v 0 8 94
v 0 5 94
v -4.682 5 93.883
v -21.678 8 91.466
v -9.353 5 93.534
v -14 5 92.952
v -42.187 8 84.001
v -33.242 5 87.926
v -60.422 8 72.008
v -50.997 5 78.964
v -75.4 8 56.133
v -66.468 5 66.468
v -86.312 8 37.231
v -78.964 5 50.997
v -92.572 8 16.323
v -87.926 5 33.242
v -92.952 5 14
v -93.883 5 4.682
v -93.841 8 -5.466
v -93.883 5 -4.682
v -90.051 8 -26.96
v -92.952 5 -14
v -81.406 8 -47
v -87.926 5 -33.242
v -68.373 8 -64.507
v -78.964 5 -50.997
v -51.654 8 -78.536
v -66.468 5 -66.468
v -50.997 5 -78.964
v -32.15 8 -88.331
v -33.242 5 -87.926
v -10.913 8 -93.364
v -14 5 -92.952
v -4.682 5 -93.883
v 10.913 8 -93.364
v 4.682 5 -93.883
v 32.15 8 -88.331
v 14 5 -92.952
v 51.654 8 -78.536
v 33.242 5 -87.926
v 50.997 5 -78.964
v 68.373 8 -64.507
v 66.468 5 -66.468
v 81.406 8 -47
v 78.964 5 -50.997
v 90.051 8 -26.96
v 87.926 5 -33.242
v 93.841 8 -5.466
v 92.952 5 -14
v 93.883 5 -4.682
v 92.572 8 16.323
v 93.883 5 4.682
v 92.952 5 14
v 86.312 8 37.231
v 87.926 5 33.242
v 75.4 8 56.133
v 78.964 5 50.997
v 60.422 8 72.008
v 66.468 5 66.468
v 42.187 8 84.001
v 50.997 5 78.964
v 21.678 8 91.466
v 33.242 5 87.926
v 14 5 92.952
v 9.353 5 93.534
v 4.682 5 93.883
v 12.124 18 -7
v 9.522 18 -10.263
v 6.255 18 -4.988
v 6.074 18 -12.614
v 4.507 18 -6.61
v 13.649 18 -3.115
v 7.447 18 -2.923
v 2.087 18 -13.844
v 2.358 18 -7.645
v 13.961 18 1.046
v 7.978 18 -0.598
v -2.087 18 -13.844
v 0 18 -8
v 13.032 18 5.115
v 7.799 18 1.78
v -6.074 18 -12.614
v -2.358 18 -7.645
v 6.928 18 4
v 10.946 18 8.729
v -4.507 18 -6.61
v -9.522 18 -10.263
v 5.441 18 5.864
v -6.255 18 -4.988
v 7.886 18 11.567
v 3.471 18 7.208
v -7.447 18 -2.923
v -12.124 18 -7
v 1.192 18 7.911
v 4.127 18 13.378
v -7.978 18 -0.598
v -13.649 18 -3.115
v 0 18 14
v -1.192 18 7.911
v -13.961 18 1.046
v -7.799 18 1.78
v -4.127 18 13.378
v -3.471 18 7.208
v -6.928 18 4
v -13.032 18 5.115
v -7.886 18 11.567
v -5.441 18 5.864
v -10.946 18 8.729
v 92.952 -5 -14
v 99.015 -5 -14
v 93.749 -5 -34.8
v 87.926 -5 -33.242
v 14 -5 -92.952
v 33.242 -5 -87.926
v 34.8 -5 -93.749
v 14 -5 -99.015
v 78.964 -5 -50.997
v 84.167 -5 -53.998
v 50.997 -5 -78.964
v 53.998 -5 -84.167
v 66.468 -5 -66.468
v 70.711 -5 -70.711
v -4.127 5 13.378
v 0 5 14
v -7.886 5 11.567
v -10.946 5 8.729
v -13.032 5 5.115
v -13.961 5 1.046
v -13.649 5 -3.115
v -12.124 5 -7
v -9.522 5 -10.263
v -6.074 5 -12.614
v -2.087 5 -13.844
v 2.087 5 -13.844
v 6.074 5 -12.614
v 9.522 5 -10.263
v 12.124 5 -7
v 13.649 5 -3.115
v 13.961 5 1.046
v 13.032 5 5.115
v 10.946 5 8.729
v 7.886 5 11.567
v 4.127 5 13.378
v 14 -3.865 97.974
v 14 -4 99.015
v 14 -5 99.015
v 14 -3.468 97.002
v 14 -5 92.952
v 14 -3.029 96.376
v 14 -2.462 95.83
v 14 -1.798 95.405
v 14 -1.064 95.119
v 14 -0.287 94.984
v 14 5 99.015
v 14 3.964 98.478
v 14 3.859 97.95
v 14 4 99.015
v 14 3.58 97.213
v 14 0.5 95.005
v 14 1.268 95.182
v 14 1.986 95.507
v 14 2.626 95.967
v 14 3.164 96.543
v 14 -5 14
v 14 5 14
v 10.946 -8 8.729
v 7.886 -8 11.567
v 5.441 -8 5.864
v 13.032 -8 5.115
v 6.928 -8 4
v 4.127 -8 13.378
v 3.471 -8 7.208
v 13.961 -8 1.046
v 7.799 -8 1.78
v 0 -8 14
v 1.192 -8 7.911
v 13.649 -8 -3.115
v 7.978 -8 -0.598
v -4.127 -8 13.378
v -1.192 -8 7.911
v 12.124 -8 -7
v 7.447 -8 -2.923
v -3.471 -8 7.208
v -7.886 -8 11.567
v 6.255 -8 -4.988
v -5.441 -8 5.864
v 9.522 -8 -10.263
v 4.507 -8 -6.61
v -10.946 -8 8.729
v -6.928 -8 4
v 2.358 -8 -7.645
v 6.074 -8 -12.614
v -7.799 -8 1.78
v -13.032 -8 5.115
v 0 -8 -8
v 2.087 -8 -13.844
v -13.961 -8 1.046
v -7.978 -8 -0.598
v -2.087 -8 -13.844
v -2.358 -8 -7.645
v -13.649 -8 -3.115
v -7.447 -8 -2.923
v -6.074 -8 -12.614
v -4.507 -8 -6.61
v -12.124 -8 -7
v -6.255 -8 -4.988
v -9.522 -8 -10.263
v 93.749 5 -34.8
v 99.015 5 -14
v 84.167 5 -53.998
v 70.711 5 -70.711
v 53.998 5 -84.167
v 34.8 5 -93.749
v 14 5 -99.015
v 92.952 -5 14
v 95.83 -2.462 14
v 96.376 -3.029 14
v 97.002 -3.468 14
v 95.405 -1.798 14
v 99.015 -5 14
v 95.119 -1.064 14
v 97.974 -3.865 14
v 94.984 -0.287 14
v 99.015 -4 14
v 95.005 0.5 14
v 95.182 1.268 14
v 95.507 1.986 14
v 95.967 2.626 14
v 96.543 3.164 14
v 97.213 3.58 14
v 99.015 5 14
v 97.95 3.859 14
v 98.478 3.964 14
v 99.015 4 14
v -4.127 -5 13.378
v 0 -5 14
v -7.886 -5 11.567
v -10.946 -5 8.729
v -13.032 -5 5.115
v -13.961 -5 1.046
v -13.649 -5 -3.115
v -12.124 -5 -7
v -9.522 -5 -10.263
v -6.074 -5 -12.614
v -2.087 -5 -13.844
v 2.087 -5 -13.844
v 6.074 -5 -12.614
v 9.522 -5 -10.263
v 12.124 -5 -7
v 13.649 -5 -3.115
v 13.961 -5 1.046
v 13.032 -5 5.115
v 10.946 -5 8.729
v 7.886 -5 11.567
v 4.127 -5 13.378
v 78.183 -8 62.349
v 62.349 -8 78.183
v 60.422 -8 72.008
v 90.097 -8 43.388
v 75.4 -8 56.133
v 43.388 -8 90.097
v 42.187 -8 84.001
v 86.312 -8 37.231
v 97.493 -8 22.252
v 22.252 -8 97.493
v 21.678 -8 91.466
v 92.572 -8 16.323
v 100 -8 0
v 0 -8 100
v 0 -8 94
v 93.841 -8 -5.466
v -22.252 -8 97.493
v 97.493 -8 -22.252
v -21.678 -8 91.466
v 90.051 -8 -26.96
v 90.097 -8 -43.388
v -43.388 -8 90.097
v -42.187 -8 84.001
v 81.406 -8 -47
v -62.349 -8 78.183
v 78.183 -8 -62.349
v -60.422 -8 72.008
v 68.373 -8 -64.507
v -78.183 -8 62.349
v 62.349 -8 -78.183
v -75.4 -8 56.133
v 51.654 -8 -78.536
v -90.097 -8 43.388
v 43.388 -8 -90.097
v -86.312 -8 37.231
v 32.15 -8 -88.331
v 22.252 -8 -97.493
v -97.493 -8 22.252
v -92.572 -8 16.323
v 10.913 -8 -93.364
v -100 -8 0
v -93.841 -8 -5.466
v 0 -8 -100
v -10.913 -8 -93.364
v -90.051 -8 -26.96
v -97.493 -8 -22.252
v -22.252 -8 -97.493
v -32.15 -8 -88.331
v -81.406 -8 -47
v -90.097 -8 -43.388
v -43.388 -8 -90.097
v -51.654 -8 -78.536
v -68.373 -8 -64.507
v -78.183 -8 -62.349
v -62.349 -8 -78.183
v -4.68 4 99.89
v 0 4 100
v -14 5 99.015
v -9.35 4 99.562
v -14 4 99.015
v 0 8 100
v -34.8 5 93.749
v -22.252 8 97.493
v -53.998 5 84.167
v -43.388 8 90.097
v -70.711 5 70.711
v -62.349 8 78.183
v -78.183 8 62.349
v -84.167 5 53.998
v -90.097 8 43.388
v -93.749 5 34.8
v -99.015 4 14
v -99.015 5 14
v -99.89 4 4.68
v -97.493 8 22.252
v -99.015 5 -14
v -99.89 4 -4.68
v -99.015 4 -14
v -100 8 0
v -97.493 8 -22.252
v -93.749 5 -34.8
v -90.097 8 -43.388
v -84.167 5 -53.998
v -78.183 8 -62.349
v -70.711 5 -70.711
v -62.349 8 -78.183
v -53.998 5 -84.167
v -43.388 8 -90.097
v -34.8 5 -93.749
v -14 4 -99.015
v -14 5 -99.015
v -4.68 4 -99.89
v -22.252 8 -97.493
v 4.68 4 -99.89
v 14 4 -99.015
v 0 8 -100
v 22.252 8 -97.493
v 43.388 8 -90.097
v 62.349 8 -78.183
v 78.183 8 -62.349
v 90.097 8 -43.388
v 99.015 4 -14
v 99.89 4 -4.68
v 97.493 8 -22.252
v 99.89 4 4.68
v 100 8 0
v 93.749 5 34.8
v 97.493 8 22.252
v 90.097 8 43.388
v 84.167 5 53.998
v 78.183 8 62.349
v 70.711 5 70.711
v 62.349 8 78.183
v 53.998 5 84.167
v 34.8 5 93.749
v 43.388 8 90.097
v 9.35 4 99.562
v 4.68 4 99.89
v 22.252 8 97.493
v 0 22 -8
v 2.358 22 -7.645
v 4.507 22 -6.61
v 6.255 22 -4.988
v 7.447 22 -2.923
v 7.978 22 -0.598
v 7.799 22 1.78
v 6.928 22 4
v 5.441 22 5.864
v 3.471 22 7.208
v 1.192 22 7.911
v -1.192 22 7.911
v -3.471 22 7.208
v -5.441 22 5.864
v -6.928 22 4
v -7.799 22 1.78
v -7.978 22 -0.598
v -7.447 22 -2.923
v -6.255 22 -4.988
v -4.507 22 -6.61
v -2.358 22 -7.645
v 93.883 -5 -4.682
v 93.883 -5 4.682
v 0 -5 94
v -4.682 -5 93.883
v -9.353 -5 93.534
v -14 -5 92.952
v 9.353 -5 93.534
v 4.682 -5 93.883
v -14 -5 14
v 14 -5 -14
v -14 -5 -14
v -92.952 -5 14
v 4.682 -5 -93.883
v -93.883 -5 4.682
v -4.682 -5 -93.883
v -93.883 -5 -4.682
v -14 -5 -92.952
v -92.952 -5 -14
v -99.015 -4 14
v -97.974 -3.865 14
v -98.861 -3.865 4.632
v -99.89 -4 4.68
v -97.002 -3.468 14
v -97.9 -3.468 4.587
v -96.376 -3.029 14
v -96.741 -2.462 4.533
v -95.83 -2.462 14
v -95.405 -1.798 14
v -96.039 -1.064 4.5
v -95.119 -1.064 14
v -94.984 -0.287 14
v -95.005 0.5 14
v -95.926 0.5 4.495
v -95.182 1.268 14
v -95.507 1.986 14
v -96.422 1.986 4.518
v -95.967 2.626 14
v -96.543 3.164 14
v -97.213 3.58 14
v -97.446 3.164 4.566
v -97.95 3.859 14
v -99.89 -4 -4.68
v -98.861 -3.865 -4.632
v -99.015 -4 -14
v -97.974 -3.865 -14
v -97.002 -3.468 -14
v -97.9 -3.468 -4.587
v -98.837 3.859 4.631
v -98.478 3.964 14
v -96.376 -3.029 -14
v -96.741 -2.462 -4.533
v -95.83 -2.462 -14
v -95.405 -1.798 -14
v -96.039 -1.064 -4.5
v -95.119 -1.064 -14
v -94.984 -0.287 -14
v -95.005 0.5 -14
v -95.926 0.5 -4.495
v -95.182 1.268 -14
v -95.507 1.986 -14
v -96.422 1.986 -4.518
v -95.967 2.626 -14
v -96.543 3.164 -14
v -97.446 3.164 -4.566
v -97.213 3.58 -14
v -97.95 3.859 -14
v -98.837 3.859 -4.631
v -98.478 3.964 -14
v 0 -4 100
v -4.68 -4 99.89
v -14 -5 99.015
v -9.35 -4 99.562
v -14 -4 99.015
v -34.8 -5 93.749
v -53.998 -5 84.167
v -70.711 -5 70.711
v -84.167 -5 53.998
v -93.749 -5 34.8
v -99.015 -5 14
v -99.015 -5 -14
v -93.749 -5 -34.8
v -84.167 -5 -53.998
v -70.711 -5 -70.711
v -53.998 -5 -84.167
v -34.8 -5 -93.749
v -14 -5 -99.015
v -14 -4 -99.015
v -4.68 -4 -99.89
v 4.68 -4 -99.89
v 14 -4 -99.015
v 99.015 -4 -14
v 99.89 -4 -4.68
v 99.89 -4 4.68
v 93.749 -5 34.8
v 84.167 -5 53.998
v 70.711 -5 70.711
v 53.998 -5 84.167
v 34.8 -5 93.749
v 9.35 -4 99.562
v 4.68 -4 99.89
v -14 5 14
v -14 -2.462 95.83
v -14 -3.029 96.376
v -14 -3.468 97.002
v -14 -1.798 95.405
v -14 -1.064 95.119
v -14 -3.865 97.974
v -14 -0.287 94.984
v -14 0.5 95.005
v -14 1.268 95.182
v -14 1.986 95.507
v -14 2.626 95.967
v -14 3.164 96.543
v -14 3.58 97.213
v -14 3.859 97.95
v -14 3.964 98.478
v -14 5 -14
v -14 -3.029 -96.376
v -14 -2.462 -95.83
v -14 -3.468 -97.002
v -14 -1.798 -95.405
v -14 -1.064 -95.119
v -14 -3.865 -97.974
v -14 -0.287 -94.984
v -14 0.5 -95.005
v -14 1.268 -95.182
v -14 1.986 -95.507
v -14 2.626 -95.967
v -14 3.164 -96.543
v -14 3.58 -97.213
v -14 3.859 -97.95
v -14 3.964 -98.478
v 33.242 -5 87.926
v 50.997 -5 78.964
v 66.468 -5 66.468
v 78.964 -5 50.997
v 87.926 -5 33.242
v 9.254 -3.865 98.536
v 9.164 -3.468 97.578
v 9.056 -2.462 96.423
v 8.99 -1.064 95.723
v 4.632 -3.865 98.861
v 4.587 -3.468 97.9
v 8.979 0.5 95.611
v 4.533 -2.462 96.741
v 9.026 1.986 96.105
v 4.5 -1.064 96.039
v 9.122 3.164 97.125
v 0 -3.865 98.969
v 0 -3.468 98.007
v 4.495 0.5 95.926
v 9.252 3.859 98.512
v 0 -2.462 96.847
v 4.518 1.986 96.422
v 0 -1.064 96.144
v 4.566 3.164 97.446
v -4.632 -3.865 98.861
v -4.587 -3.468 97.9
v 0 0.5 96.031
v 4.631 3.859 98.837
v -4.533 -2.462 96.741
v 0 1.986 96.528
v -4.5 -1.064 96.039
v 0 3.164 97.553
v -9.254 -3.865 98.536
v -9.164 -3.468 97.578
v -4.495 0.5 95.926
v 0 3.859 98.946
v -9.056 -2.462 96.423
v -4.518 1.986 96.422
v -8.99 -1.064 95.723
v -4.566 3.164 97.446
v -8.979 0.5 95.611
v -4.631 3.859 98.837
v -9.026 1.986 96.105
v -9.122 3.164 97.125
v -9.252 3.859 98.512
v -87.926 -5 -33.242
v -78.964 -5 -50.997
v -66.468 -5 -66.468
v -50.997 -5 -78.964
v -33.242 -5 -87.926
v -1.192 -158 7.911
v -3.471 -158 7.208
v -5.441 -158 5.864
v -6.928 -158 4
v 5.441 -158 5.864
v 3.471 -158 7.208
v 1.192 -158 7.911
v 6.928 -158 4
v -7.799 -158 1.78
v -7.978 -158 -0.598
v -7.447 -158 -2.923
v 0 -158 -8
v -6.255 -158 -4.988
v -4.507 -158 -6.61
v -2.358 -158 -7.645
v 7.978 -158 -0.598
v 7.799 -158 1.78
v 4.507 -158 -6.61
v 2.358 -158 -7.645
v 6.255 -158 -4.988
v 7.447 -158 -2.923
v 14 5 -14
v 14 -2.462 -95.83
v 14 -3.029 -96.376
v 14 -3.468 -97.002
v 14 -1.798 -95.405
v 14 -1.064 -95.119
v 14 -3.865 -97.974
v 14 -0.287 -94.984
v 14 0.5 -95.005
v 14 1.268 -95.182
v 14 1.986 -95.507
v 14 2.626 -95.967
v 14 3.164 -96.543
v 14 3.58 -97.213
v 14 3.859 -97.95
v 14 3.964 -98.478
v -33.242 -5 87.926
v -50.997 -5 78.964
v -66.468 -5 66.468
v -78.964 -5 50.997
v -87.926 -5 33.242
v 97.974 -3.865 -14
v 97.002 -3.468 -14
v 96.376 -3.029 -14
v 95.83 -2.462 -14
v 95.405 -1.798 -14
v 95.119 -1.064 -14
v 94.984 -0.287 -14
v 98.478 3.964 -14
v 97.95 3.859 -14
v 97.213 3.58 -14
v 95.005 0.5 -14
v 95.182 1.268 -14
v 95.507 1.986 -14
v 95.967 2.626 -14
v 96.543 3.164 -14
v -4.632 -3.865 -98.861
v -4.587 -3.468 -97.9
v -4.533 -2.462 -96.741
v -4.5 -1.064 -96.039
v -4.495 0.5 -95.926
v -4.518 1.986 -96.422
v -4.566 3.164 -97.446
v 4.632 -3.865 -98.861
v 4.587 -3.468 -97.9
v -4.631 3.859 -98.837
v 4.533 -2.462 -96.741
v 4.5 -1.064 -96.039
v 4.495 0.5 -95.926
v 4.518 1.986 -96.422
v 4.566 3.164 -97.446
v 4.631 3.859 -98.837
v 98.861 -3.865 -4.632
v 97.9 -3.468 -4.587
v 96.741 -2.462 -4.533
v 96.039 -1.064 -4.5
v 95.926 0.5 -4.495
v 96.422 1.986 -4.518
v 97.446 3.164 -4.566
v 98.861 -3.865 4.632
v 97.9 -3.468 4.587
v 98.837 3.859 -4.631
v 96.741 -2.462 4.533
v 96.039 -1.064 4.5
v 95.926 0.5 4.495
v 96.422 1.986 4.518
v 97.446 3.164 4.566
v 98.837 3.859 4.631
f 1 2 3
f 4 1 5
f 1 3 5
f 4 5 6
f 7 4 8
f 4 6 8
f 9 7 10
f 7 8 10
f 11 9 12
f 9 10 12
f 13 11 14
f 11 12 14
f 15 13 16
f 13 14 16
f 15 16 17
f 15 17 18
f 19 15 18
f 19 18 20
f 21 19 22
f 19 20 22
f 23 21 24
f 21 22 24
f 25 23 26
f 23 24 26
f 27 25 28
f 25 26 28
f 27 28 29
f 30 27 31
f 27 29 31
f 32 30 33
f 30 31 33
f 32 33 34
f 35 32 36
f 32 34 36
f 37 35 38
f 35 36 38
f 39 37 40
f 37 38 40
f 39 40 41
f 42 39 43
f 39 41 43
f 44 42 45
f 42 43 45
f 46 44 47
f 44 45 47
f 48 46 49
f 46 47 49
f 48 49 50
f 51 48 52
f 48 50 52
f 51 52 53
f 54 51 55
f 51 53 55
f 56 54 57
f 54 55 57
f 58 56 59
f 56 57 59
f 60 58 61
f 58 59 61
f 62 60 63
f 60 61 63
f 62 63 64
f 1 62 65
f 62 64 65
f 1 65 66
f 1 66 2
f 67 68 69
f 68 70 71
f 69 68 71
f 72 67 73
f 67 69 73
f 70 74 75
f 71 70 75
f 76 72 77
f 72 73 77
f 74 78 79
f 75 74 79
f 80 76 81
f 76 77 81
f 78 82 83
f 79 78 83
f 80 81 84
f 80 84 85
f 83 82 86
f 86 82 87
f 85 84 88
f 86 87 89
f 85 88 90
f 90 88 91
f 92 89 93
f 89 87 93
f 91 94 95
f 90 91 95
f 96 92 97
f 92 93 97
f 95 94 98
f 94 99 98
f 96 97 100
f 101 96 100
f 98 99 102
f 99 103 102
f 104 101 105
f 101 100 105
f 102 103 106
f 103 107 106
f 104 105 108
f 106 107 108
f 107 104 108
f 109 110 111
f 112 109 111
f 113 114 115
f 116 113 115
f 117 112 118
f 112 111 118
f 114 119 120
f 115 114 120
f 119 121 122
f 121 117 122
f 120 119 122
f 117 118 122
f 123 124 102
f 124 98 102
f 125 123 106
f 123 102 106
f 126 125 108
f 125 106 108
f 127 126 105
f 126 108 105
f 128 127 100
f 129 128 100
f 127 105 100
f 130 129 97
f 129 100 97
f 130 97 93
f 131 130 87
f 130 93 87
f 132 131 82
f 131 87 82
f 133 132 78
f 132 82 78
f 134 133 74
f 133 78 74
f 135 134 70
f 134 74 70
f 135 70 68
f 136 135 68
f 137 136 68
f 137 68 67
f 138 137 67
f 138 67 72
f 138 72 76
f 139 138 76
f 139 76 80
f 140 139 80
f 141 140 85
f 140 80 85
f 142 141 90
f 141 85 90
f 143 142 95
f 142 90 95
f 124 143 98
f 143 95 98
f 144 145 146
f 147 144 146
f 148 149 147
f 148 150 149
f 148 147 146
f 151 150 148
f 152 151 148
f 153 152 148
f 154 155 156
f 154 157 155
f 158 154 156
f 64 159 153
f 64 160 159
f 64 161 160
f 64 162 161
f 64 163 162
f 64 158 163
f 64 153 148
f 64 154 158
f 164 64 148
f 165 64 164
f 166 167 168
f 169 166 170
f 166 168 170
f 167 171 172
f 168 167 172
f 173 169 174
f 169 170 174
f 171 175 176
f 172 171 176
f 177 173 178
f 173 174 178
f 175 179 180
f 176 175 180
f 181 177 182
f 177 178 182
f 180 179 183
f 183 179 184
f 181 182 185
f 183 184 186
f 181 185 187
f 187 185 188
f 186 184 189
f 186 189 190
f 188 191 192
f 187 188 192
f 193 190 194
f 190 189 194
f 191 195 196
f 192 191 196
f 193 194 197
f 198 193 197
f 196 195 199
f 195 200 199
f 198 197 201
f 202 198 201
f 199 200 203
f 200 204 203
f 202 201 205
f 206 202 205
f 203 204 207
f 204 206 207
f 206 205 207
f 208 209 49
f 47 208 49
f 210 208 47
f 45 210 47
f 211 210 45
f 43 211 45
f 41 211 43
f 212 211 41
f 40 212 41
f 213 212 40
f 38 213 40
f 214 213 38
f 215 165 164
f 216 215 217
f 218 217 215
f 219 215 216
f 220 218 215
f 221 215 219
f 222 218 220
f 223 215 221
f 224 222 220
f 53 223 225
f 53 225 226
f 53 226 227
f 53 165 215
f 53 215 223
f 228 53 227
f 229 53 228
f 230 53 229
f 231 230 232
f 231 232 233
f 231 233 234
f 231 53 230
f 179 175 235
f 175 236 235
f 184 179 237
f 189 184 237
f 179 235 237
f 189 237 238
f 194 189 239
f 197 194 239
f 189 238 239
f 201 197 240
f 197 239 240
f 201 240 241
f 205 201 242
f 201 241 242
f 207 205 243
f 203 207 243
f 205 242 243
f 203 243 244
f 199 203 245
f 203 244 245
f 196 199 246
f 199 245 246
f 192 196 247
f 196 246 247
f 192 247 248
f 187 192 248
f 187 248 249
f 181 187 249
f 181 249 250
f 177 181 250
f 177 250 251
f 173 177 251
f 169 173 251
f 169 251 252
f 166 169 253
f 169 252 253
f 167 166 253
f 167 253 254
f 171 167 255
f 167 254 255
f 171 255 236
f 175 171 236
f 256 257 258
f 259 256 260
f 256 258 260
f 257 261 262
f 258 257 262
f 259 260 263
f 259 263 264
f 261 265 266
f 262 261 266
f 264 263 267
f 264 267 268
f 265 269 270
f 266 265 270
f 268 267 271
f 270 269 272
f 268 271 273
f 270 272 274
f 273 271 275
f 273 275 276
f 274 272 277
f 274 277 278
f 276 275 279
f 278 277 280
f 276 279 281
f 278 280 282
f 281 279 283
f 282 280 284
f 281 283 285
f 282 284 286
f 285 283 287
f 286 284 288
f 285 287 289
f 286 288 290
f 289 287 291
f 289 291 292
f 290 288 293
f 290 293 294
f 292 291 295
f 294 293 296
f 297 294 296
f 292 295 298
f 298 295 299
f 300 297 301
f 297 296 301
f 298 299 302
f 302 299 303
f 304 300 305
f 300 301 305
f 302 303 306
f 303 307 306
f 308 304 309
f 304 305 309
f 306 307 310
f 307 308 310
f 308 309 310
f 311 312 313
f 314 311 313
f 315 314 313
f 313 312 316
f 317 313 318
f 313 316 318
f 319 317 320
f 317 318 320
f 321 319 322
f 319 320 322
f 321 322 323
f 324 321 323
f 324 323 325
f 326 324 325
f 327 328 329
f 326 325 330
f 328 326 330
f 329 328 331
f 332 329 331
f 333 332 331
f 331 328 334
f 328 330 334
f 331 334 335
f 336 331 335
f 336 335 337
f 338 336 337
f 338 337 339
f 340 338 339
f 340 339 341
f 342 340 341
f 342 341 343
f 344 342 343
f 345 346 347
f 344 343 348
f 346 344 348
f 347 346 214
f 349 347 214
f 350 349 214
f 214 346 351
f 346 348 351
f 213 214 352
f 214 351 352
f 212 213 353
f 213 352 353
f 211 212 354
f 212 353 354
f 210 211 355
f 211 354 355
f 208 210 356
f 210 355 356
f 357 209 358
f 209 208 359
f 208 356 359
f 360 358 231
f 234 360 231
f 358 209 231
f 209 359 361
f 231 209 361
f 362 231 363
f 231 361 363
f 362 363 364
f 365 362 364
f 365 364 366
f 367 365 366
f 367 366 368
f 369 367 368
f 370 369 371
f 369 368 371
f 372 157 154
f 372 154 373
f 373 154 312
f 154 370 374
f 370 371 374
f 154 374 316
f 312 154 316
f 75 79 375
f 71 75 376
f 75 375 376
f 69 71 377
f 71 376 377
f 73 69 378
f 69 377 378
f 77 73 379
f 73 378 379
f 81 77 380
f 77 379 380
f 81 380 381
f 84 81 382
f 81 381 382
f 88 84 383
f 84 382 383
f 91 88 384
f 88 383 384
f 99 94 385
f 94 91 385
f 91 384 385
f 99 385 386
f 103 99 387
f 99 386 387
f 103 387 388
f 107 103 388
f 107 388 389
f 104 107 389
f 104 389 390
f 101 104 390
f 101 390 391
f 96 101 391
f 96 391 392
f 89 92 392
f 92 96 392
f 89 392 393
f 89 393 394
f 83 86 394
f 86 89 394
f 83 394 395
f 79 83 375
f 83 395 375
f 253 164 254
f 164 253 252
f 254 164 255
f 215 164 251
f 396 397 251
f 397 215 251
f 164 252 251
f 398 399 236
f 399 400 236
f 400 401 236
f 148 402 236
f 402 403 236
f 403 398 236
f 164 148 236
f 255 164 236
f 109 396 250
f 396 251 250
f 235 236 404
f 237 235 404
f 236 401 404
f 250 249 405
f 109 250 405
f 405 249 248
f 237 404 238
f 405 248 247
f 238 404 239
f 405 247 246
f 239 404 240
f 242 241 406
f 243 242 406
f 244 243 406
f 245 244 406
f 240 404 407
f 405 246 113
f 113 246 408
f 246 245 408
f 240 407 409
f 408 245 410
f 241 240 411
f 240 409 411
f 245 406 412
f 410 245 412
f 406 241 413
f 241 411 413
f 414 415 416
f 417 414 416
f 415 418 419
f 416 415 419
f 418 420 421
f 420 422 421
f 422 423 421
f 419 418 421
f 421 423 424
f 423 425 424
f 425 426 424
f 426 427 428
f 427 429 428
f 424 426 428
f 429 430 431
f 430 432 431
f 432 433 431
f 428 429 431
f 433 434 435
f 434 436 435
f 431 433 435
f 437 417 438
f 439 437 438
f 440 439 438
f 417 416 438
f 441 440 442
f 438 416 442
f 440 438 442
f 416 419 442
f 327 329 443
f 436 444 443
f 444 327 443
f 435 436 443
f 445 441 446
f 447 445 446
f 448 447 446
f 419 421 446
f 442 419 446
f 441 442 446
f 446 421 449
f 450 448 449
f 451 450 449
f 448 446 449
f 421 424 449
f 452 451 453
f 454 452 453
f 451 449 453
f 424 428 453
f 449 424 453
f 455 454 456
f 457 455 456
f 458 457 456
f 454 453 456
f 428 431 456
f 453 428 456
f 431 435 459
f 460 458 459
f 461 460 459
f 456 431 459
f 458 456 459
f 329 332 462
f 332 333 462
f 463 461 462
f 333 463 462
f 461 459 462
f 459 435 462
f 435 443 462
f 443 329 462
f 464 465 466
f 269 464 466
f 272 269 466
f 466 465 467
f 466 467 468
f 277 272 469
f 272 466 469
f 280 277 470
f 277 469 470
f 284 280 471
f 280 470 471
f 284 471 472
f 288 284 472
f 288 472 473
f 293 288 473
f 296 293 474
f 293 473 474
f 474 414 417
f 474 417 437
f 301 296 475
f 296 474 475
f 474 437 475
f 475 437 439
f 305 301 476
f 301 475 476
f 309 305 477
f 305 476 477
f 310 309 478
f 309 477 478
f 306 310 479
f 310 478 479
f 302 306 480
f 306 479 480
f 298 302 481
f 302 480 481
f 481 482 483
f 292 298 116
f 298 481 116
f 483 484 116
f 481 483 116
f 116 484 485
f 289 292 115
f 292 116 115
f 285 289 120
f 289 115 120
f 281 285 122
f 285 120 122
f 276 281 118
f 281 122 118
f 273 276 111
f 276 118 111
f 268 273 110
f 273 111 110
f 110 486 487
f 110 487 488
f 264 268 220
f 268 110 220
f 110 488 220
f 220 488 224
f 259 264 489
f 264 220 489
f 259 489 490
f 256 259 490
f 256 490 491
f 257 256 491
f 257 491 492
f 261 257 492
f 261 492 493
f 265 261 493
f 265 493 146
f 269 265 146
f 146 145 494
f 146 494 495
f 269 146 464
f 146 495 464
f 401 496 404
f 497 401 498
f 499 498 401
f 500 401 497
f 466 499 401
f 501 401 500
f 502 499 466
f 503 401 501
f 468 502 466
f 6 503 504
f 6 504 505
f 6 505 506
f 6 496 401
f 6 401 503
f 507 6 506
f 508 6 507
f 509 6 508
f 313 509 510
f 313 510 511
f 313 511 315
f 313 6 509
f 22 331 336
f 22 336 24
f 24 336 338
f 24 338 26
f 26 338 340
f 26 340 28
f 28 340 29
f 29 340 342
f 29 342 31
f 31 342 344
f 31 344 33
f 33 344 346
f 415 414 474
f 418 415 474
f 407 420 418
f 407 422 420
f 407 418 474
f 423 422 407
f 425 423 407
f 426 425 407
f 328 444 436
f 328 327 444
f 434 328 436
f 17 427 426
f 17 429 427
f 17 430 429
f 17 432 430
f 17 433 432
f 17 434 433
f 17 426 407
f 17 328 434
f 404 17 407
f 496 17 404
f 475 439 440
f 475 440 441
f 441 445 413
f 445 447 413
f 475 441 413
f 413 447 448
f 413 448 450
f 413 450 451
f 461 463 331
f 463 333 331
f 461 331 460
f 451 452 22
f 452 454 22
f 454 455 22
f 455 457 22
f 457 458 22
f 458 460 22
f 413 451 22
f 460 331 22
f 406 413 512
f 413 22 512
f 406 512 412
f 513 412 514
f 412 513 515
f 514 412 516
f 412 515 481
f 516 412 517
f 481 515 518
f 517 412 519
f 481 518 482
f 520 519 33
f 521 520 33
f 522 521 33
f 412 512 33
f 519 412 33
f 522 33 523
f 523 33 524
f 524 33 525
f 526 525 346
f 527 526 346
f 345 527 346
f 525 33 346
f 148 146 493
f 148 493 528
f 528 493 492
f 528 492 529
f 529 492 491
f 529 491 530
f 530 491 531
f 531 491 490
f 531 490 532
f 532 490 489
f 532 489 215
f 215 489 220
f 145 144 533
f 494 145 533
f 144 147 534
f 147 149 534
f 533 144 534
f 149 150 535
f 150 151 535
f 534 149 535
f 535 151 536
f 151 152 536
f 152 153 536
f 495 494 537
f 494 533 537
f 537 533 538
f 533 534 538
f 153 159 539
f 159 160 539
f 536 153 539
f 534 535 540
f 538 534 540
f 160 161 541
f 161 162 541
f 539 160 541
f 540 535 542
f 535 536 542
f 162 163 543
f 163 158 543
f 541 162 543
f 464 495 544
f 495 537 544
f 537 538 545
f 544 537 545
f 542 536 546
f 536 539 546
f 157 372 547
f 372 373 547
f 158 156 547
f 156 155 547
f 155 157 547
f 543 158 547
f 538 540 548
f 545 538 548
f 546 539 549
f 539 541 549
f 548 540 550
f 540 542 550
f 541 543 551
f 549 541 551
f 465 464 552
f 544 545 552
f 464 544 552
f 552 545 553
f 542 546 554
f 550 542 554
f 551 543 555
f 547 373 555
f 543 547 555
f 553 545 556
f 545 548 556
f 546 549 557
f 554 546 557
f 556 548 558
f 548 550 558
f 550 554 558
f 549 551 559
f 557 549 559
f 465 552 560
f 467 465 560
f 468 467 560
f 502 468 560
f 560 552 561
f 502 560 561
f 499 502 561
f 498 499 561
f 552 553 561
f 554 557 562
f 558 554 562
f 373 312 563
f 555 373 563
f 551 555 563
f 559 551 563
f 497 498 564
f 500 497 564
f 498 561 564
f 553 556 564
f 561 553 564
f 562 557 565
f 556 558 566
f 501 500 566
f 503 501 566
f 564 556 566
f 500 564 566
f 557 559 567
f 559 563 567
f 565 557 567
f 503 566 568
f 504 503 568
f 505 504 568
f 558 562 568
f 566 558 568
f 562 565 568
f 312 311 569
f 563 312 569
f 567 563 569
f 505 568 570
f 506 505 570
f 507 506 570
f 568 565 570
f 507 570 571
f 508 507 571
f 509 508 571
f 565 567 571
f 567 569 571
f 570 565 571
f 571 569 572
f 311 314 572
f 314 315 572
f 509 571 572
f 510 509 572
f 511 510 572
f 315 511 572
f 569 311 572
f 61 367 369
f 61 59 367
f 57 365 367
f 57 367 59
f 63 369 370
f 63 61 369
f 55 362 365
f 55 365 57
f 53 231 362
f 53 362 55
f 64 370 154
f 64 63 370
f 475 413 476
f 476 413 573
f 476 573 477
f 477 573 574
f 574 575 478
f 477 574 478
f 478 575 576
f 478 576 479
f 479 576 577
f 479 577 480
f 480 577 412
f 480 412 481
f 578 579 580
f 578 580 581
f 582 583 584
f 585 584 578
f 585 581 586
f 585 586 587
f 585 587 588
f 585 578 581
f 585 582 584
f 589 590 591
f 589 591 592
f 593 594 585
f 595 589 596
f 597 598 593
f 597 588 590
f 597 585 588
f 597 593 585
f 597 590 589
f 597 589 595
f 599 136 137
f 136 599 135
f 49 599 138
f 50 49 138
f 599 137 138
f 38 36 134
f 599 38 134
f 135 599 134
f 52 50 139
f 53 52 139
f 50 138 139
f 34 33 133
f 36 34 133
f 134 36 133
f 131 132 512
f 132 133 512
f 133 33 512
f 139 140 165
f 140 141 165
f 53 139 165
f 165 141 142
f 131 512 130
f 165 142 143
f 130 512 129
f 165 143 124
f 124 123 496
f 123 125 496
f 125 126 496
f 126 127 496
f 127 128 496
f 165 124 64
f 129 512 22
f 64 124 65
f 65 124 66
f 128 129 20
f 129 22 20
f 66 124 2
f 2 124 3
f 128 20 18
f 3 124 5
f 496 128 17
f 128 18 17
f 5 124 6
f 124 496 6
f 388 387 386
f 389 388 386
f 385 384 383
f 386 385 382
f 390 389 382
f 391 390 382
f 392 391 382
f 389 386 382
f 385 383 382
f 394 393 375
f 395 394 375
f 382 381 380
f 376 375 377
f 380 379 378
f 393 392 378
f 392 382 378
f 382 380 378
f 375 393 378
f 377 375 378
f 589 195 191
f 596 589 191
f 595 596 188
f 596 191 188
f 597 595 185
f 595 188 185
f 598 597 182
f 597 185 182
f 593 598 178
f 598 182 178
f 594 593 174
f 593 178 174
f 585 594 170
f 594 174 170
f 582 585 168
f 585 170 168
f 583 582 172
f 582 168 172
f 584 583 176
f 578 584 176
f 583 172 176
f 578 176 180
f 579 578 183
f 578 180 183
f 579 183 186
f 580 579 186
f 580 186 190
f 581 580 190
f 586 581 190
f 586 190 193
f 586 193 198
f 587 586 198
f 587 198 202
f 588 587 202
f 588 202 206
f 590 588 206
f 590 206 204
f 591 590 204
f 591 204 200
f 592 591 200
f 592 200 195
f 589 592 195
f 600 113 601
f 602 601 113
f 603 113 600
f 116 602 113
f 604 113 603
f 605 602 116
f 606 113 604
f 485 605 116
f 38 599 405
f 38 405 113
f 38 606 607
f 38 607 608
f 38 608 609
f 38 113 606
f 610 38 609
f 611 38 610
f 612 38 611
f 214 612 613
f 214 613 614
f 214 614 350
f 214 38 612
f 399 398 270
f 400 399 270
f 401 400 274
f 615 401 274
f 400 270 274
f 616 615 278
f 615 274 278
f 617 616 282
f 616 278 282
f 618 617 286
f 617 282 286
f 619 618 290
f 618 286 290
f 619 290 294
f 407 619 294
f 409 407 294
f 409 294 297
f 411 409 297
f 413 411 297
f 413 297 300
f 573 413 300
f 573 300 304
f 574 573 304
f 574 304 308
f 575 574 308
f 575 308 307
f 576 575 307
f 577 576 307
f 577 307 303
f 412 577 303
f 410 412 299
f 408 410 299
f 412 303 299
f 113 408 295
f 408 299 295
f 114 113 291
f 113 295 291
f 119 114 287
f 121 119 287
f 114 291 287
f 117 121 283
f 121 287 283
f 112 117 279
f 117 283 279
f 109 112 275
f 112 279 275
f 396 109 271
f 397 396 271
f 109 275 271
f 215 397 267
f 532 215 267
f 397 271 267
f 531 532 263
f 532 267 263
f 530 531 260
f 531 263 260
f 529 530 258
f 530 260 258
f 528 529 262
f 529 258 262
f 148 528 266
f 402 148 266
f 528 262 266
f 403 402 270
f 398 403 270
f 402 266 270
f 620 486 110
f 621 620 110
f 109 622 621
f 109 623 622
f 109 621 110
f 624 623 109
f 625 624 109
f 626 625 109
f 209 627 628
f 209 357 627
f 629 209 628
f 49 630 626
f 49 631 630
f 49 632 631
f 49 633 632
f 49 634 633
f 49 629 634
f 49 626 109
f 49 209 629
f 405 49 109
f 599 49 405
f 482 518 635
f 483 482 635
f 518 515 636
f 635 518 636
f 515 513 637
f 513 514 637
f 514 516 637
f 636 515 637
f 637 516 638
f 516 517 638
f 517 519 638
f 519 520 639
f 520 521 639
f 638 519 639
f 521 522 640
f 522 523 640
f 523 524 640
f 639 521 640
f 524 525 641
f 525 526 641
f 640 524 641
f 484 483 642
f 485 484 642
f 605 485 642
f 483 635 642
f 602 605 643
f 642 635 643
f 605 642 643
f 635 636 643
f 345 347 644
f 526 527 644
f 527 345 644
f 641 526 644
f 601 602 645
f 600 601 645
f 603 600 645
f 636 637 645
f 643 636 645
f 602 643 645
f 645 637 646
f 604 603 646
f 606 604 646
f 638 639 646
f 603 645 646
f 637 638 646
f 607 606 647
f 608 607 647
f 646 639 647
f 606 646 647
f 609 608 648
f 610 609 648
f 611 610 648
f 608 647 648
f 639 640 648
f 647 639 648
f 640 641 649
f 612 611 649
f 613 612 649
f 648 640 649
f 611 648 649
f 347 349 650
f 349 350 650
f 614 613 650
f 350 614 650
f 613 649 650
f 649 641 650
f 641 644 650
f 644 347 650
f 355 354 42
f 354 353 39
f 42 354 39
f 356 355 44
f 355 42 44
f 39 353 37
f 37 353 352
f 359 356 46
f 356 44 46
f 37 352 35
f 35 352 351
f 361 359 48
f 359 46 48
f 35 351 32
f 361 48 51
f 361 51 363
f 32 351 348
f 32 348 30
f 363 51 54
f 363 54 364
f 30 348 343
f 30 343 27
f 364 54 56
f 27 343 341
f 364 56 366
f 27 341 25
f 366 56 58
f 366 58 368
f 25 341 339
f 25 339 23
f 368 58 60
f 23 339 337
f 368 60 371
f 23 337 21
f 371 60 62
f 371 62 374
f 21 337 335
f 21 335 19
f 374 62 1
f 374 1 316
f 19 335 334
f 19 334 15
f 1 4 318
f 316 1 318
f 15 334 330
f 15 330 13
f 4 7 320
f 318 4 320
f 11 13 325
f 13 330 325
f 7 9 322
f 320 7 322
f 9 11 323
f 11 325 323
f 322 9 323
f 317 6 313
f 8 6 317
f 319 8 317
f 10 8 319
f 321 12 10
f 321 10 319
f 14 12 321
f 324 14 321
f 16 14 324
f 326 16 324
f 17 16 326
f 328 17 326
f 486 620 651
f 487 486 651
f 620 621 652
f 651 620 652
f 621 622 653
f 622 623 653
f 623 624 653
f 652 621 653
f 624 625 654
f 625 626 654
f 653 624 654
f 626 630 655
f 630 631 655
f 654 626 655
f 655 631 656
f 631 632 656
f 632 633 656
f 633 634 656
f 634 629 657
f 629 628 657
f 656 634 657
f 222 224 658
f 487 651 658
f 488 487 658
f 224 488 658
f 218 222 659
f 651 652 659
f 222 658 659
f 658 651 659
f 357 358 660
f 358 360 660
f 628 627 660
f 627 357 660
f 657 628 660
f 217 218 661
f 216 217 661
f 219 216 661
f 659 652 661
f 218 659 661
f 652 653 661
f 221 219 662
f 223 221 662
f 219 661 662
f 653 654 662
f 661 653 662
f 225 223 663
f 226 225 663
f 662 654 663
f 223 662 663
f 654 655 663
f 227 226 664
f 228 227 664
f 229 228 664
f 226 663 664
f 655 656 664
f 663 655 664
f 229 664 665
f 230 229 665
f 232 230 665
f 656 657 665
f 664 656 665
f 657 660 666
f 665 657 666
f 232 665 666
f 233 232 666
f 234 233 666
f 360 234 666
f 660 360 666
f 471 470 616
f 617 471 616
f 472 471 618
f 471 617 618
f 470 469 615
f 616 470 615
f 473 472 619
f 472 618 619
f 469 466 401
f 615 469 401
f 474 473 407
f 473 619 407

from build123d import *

# Parameters (mm, degrees)
CUT_EXTRUDE1_REACH       = 144.018
BOSS_EXTRUDE1_DEPTH      = 150
BOSS_EXTRUDE1_DEPTH_BACK = 30
SKETCH3_R                = 8


with BuildPart() as part:
    # Sketch1 → Revolve2 (revolve)
    with BuildSketch(Plane.XY, mode=Mode.PRIVATE) as revolve2_sk:
        with BuildLine():
            Line((8, 8), (8, -8))
            Line((8, -8), (14, -8))
            Line((14, -8), (14, -5))
            Line((14, -5), (94, -5))
            Line((94, -5), (94, -8))
            Line((94, -8), (100, -8))
            Line((100, -8), (100, -4))
            ThreePointArc((100, -4), (96, 0), (100, 4))
            Line((100, 4), (100, 8))
            Line((100, 8), (94, 8))
            Line((94, 8), (94, 5))
            Line((94, 5), (14, 5))
            Line((14, 5), (14, 8))
            Line((14, 8), (14, 18))
            Line((14, 18), (8, 18))
            Line((8, 18), (8, 8))
        make_face()
    revolve(revolve2_sk.sketch.rotate(Axis((0, 60.317614973, 0), (0, -1, 0)), 90), axis=Axis((0, 60.317614973, 0), (0, -1, 0)))

    # Cut-Extrude1: up to this face of the body (flat: up to its plane)
    cut_extrude1_end = Plane(part.part.faces().sort_by_distance((0, -5, -16.658721497))[0])
    # Sketch2 → Cut-Extrude1 (cut, up to the picked face)
    with BuildSketch(Plane(origin=(0, 5, 0), x_dir=(1, 0, 0), z_dir=(0, 1, 0)), mode=Mode.PRIVATE) as cut_extrude1_sk1:
        with BuildLine():
            Line((14, 14), (14, 173.435867109))
            ThreePointArc((14, 173.435867109), (123.036579926, 123.036579926), (173.435867109, 14))
            Line((173.435867109, 14), (14, 14))
        make_face()
    cut_extrude1_tool1 = split(extrude(cut_extrude1_sk1.sketch, amount=-CUT_EXTRUDE1_REACH, mode=Mode.PRIVATE), bisect_by=cut_extrude1_end, keep=Keep.BOTH, mode=Mode.PRIVATE)
    # Sketch2 → Cut-Extrude1 (cut, up to the picked face)
    with BuildSketch(Plane(origin=(0, 5, 0), x_dir=(1, 0, 0), z_dir=(0, 1, 0)), mode=Mode.PRIVATE) as cut_extrude1_sk2:
        with BuildLine():
            Line((-173.435867109, -14), (-14, -14))
            Line((-14, -14), (-14, -173.435867109))
            ThreePointArc((-14, -173.435867109), (-123.036579926, -123.036579926), (-173.435867109, -14))
        make_face()
    cut_extrude1_tool2 = split(extrude(cut_extrude1_sk2.sketch, amount=-CUT_EXTRUDE1_REACH, mode=Mode.PRIVATE), bisect_by=cut_extrude1_end, keep=Keep.BOTH, mode=Mode.PRIVATE)
    # Sketch2 → Cut-Extrude1 (cut, up to the picked face)
    with BuildSketch(Plane(origin=(0, 5, 0), x_dir=(1, 0, 0), z_dir=(0, 1, 0)), mode=Mode.PRIVATE) as cut_extrude1_sk3:
        with BuildLine():
            Line((-14, 14), (-14, 173.435867109))
            ThreePointArc((-14, 173.435867109), (-123.036579926, 123.036579926), (-173.435867109, 14))
            Line((-173.435867109, 14), (-14, 14))
        make_face()
    cut_extrude1_tool3 = split(extrude(cut_extrude1_sk3.sketch, amount=-CUT_EXTRUDE1_REACH, mode=Mode.PRIVATE), bisect_by=cut_extrude1_end, keep=Keep.BOTH, mode=Mode.PRIVATE)
    # Sketch2 → Cut-Extrude1 (cut, up to the picked face)
    with BuildSketch(Plane(origin=(0, 5, 0), x_dir=(1, 0, 0), z_dir=(0, 1, 0)), mode=Mode.PRIVATE) as cut_extrude1_sk4:
        with BuildLine():
            Line((14, -14), (173.435867109, -14))
            ThreePointArc((173.435867109, -14), (123.036579926, -123.036579926), (14, -173.435867109))
            Line((14, -173.435867109), (14, -14))
        make_face()
    cut_extrude1_tool4 = split(extrude(cut_extrude1_sk4.sketch, amount=-CUT_EXTRUDE1_REACH, mode=Mode.PRIVATE), bisect_by=cut_extrude1_end, keep=Keep.BOTH, mode=Mode.PRIVATE)
    add(cut_extrude1_tool1.solids().sort_by(Axis((80.012708, 5, -80.012708), (0, -1, 0)))[0], mode=Mode.SUBTRACT)
    add(cut_extrude1_tool2.solids().sort_by(Axis((-80.012708, 5, 80.012708), (0, -1, 0)))[0], mode=Mode.SUBTRACT)
    add(cut_extrude1_tool3.solids().sort_by(Axis((-80.012708, 5, -80.012708), (0, -1, 0)))[0], mode=Mode.SUBTRACT)
    add(cut_extrude1_tool4.solids().sort_by(Axis((80.012708, 5, 80.012708), (0, -1, 0)))[0], mode=Mode.SUBTRACT)

    # Sketch3 → Boss-Extrude1 (add, two sides: drawn at the far end of the back side and taken through both)
    with BuildSketch(Plane.XZ.offset(8).offset(-BOSS_EXTRUDE1_DEPTH_BACK)):
        with Locations(Location((0, 0, 0), (0, 0, 270))):
            Circle(SKETCH3_R)
    extrude(amount=BOSS_EXTRUDE1_DEPTH + BOSS_EXTRUDE1_DEPTH_BACK)


solid = part.part
